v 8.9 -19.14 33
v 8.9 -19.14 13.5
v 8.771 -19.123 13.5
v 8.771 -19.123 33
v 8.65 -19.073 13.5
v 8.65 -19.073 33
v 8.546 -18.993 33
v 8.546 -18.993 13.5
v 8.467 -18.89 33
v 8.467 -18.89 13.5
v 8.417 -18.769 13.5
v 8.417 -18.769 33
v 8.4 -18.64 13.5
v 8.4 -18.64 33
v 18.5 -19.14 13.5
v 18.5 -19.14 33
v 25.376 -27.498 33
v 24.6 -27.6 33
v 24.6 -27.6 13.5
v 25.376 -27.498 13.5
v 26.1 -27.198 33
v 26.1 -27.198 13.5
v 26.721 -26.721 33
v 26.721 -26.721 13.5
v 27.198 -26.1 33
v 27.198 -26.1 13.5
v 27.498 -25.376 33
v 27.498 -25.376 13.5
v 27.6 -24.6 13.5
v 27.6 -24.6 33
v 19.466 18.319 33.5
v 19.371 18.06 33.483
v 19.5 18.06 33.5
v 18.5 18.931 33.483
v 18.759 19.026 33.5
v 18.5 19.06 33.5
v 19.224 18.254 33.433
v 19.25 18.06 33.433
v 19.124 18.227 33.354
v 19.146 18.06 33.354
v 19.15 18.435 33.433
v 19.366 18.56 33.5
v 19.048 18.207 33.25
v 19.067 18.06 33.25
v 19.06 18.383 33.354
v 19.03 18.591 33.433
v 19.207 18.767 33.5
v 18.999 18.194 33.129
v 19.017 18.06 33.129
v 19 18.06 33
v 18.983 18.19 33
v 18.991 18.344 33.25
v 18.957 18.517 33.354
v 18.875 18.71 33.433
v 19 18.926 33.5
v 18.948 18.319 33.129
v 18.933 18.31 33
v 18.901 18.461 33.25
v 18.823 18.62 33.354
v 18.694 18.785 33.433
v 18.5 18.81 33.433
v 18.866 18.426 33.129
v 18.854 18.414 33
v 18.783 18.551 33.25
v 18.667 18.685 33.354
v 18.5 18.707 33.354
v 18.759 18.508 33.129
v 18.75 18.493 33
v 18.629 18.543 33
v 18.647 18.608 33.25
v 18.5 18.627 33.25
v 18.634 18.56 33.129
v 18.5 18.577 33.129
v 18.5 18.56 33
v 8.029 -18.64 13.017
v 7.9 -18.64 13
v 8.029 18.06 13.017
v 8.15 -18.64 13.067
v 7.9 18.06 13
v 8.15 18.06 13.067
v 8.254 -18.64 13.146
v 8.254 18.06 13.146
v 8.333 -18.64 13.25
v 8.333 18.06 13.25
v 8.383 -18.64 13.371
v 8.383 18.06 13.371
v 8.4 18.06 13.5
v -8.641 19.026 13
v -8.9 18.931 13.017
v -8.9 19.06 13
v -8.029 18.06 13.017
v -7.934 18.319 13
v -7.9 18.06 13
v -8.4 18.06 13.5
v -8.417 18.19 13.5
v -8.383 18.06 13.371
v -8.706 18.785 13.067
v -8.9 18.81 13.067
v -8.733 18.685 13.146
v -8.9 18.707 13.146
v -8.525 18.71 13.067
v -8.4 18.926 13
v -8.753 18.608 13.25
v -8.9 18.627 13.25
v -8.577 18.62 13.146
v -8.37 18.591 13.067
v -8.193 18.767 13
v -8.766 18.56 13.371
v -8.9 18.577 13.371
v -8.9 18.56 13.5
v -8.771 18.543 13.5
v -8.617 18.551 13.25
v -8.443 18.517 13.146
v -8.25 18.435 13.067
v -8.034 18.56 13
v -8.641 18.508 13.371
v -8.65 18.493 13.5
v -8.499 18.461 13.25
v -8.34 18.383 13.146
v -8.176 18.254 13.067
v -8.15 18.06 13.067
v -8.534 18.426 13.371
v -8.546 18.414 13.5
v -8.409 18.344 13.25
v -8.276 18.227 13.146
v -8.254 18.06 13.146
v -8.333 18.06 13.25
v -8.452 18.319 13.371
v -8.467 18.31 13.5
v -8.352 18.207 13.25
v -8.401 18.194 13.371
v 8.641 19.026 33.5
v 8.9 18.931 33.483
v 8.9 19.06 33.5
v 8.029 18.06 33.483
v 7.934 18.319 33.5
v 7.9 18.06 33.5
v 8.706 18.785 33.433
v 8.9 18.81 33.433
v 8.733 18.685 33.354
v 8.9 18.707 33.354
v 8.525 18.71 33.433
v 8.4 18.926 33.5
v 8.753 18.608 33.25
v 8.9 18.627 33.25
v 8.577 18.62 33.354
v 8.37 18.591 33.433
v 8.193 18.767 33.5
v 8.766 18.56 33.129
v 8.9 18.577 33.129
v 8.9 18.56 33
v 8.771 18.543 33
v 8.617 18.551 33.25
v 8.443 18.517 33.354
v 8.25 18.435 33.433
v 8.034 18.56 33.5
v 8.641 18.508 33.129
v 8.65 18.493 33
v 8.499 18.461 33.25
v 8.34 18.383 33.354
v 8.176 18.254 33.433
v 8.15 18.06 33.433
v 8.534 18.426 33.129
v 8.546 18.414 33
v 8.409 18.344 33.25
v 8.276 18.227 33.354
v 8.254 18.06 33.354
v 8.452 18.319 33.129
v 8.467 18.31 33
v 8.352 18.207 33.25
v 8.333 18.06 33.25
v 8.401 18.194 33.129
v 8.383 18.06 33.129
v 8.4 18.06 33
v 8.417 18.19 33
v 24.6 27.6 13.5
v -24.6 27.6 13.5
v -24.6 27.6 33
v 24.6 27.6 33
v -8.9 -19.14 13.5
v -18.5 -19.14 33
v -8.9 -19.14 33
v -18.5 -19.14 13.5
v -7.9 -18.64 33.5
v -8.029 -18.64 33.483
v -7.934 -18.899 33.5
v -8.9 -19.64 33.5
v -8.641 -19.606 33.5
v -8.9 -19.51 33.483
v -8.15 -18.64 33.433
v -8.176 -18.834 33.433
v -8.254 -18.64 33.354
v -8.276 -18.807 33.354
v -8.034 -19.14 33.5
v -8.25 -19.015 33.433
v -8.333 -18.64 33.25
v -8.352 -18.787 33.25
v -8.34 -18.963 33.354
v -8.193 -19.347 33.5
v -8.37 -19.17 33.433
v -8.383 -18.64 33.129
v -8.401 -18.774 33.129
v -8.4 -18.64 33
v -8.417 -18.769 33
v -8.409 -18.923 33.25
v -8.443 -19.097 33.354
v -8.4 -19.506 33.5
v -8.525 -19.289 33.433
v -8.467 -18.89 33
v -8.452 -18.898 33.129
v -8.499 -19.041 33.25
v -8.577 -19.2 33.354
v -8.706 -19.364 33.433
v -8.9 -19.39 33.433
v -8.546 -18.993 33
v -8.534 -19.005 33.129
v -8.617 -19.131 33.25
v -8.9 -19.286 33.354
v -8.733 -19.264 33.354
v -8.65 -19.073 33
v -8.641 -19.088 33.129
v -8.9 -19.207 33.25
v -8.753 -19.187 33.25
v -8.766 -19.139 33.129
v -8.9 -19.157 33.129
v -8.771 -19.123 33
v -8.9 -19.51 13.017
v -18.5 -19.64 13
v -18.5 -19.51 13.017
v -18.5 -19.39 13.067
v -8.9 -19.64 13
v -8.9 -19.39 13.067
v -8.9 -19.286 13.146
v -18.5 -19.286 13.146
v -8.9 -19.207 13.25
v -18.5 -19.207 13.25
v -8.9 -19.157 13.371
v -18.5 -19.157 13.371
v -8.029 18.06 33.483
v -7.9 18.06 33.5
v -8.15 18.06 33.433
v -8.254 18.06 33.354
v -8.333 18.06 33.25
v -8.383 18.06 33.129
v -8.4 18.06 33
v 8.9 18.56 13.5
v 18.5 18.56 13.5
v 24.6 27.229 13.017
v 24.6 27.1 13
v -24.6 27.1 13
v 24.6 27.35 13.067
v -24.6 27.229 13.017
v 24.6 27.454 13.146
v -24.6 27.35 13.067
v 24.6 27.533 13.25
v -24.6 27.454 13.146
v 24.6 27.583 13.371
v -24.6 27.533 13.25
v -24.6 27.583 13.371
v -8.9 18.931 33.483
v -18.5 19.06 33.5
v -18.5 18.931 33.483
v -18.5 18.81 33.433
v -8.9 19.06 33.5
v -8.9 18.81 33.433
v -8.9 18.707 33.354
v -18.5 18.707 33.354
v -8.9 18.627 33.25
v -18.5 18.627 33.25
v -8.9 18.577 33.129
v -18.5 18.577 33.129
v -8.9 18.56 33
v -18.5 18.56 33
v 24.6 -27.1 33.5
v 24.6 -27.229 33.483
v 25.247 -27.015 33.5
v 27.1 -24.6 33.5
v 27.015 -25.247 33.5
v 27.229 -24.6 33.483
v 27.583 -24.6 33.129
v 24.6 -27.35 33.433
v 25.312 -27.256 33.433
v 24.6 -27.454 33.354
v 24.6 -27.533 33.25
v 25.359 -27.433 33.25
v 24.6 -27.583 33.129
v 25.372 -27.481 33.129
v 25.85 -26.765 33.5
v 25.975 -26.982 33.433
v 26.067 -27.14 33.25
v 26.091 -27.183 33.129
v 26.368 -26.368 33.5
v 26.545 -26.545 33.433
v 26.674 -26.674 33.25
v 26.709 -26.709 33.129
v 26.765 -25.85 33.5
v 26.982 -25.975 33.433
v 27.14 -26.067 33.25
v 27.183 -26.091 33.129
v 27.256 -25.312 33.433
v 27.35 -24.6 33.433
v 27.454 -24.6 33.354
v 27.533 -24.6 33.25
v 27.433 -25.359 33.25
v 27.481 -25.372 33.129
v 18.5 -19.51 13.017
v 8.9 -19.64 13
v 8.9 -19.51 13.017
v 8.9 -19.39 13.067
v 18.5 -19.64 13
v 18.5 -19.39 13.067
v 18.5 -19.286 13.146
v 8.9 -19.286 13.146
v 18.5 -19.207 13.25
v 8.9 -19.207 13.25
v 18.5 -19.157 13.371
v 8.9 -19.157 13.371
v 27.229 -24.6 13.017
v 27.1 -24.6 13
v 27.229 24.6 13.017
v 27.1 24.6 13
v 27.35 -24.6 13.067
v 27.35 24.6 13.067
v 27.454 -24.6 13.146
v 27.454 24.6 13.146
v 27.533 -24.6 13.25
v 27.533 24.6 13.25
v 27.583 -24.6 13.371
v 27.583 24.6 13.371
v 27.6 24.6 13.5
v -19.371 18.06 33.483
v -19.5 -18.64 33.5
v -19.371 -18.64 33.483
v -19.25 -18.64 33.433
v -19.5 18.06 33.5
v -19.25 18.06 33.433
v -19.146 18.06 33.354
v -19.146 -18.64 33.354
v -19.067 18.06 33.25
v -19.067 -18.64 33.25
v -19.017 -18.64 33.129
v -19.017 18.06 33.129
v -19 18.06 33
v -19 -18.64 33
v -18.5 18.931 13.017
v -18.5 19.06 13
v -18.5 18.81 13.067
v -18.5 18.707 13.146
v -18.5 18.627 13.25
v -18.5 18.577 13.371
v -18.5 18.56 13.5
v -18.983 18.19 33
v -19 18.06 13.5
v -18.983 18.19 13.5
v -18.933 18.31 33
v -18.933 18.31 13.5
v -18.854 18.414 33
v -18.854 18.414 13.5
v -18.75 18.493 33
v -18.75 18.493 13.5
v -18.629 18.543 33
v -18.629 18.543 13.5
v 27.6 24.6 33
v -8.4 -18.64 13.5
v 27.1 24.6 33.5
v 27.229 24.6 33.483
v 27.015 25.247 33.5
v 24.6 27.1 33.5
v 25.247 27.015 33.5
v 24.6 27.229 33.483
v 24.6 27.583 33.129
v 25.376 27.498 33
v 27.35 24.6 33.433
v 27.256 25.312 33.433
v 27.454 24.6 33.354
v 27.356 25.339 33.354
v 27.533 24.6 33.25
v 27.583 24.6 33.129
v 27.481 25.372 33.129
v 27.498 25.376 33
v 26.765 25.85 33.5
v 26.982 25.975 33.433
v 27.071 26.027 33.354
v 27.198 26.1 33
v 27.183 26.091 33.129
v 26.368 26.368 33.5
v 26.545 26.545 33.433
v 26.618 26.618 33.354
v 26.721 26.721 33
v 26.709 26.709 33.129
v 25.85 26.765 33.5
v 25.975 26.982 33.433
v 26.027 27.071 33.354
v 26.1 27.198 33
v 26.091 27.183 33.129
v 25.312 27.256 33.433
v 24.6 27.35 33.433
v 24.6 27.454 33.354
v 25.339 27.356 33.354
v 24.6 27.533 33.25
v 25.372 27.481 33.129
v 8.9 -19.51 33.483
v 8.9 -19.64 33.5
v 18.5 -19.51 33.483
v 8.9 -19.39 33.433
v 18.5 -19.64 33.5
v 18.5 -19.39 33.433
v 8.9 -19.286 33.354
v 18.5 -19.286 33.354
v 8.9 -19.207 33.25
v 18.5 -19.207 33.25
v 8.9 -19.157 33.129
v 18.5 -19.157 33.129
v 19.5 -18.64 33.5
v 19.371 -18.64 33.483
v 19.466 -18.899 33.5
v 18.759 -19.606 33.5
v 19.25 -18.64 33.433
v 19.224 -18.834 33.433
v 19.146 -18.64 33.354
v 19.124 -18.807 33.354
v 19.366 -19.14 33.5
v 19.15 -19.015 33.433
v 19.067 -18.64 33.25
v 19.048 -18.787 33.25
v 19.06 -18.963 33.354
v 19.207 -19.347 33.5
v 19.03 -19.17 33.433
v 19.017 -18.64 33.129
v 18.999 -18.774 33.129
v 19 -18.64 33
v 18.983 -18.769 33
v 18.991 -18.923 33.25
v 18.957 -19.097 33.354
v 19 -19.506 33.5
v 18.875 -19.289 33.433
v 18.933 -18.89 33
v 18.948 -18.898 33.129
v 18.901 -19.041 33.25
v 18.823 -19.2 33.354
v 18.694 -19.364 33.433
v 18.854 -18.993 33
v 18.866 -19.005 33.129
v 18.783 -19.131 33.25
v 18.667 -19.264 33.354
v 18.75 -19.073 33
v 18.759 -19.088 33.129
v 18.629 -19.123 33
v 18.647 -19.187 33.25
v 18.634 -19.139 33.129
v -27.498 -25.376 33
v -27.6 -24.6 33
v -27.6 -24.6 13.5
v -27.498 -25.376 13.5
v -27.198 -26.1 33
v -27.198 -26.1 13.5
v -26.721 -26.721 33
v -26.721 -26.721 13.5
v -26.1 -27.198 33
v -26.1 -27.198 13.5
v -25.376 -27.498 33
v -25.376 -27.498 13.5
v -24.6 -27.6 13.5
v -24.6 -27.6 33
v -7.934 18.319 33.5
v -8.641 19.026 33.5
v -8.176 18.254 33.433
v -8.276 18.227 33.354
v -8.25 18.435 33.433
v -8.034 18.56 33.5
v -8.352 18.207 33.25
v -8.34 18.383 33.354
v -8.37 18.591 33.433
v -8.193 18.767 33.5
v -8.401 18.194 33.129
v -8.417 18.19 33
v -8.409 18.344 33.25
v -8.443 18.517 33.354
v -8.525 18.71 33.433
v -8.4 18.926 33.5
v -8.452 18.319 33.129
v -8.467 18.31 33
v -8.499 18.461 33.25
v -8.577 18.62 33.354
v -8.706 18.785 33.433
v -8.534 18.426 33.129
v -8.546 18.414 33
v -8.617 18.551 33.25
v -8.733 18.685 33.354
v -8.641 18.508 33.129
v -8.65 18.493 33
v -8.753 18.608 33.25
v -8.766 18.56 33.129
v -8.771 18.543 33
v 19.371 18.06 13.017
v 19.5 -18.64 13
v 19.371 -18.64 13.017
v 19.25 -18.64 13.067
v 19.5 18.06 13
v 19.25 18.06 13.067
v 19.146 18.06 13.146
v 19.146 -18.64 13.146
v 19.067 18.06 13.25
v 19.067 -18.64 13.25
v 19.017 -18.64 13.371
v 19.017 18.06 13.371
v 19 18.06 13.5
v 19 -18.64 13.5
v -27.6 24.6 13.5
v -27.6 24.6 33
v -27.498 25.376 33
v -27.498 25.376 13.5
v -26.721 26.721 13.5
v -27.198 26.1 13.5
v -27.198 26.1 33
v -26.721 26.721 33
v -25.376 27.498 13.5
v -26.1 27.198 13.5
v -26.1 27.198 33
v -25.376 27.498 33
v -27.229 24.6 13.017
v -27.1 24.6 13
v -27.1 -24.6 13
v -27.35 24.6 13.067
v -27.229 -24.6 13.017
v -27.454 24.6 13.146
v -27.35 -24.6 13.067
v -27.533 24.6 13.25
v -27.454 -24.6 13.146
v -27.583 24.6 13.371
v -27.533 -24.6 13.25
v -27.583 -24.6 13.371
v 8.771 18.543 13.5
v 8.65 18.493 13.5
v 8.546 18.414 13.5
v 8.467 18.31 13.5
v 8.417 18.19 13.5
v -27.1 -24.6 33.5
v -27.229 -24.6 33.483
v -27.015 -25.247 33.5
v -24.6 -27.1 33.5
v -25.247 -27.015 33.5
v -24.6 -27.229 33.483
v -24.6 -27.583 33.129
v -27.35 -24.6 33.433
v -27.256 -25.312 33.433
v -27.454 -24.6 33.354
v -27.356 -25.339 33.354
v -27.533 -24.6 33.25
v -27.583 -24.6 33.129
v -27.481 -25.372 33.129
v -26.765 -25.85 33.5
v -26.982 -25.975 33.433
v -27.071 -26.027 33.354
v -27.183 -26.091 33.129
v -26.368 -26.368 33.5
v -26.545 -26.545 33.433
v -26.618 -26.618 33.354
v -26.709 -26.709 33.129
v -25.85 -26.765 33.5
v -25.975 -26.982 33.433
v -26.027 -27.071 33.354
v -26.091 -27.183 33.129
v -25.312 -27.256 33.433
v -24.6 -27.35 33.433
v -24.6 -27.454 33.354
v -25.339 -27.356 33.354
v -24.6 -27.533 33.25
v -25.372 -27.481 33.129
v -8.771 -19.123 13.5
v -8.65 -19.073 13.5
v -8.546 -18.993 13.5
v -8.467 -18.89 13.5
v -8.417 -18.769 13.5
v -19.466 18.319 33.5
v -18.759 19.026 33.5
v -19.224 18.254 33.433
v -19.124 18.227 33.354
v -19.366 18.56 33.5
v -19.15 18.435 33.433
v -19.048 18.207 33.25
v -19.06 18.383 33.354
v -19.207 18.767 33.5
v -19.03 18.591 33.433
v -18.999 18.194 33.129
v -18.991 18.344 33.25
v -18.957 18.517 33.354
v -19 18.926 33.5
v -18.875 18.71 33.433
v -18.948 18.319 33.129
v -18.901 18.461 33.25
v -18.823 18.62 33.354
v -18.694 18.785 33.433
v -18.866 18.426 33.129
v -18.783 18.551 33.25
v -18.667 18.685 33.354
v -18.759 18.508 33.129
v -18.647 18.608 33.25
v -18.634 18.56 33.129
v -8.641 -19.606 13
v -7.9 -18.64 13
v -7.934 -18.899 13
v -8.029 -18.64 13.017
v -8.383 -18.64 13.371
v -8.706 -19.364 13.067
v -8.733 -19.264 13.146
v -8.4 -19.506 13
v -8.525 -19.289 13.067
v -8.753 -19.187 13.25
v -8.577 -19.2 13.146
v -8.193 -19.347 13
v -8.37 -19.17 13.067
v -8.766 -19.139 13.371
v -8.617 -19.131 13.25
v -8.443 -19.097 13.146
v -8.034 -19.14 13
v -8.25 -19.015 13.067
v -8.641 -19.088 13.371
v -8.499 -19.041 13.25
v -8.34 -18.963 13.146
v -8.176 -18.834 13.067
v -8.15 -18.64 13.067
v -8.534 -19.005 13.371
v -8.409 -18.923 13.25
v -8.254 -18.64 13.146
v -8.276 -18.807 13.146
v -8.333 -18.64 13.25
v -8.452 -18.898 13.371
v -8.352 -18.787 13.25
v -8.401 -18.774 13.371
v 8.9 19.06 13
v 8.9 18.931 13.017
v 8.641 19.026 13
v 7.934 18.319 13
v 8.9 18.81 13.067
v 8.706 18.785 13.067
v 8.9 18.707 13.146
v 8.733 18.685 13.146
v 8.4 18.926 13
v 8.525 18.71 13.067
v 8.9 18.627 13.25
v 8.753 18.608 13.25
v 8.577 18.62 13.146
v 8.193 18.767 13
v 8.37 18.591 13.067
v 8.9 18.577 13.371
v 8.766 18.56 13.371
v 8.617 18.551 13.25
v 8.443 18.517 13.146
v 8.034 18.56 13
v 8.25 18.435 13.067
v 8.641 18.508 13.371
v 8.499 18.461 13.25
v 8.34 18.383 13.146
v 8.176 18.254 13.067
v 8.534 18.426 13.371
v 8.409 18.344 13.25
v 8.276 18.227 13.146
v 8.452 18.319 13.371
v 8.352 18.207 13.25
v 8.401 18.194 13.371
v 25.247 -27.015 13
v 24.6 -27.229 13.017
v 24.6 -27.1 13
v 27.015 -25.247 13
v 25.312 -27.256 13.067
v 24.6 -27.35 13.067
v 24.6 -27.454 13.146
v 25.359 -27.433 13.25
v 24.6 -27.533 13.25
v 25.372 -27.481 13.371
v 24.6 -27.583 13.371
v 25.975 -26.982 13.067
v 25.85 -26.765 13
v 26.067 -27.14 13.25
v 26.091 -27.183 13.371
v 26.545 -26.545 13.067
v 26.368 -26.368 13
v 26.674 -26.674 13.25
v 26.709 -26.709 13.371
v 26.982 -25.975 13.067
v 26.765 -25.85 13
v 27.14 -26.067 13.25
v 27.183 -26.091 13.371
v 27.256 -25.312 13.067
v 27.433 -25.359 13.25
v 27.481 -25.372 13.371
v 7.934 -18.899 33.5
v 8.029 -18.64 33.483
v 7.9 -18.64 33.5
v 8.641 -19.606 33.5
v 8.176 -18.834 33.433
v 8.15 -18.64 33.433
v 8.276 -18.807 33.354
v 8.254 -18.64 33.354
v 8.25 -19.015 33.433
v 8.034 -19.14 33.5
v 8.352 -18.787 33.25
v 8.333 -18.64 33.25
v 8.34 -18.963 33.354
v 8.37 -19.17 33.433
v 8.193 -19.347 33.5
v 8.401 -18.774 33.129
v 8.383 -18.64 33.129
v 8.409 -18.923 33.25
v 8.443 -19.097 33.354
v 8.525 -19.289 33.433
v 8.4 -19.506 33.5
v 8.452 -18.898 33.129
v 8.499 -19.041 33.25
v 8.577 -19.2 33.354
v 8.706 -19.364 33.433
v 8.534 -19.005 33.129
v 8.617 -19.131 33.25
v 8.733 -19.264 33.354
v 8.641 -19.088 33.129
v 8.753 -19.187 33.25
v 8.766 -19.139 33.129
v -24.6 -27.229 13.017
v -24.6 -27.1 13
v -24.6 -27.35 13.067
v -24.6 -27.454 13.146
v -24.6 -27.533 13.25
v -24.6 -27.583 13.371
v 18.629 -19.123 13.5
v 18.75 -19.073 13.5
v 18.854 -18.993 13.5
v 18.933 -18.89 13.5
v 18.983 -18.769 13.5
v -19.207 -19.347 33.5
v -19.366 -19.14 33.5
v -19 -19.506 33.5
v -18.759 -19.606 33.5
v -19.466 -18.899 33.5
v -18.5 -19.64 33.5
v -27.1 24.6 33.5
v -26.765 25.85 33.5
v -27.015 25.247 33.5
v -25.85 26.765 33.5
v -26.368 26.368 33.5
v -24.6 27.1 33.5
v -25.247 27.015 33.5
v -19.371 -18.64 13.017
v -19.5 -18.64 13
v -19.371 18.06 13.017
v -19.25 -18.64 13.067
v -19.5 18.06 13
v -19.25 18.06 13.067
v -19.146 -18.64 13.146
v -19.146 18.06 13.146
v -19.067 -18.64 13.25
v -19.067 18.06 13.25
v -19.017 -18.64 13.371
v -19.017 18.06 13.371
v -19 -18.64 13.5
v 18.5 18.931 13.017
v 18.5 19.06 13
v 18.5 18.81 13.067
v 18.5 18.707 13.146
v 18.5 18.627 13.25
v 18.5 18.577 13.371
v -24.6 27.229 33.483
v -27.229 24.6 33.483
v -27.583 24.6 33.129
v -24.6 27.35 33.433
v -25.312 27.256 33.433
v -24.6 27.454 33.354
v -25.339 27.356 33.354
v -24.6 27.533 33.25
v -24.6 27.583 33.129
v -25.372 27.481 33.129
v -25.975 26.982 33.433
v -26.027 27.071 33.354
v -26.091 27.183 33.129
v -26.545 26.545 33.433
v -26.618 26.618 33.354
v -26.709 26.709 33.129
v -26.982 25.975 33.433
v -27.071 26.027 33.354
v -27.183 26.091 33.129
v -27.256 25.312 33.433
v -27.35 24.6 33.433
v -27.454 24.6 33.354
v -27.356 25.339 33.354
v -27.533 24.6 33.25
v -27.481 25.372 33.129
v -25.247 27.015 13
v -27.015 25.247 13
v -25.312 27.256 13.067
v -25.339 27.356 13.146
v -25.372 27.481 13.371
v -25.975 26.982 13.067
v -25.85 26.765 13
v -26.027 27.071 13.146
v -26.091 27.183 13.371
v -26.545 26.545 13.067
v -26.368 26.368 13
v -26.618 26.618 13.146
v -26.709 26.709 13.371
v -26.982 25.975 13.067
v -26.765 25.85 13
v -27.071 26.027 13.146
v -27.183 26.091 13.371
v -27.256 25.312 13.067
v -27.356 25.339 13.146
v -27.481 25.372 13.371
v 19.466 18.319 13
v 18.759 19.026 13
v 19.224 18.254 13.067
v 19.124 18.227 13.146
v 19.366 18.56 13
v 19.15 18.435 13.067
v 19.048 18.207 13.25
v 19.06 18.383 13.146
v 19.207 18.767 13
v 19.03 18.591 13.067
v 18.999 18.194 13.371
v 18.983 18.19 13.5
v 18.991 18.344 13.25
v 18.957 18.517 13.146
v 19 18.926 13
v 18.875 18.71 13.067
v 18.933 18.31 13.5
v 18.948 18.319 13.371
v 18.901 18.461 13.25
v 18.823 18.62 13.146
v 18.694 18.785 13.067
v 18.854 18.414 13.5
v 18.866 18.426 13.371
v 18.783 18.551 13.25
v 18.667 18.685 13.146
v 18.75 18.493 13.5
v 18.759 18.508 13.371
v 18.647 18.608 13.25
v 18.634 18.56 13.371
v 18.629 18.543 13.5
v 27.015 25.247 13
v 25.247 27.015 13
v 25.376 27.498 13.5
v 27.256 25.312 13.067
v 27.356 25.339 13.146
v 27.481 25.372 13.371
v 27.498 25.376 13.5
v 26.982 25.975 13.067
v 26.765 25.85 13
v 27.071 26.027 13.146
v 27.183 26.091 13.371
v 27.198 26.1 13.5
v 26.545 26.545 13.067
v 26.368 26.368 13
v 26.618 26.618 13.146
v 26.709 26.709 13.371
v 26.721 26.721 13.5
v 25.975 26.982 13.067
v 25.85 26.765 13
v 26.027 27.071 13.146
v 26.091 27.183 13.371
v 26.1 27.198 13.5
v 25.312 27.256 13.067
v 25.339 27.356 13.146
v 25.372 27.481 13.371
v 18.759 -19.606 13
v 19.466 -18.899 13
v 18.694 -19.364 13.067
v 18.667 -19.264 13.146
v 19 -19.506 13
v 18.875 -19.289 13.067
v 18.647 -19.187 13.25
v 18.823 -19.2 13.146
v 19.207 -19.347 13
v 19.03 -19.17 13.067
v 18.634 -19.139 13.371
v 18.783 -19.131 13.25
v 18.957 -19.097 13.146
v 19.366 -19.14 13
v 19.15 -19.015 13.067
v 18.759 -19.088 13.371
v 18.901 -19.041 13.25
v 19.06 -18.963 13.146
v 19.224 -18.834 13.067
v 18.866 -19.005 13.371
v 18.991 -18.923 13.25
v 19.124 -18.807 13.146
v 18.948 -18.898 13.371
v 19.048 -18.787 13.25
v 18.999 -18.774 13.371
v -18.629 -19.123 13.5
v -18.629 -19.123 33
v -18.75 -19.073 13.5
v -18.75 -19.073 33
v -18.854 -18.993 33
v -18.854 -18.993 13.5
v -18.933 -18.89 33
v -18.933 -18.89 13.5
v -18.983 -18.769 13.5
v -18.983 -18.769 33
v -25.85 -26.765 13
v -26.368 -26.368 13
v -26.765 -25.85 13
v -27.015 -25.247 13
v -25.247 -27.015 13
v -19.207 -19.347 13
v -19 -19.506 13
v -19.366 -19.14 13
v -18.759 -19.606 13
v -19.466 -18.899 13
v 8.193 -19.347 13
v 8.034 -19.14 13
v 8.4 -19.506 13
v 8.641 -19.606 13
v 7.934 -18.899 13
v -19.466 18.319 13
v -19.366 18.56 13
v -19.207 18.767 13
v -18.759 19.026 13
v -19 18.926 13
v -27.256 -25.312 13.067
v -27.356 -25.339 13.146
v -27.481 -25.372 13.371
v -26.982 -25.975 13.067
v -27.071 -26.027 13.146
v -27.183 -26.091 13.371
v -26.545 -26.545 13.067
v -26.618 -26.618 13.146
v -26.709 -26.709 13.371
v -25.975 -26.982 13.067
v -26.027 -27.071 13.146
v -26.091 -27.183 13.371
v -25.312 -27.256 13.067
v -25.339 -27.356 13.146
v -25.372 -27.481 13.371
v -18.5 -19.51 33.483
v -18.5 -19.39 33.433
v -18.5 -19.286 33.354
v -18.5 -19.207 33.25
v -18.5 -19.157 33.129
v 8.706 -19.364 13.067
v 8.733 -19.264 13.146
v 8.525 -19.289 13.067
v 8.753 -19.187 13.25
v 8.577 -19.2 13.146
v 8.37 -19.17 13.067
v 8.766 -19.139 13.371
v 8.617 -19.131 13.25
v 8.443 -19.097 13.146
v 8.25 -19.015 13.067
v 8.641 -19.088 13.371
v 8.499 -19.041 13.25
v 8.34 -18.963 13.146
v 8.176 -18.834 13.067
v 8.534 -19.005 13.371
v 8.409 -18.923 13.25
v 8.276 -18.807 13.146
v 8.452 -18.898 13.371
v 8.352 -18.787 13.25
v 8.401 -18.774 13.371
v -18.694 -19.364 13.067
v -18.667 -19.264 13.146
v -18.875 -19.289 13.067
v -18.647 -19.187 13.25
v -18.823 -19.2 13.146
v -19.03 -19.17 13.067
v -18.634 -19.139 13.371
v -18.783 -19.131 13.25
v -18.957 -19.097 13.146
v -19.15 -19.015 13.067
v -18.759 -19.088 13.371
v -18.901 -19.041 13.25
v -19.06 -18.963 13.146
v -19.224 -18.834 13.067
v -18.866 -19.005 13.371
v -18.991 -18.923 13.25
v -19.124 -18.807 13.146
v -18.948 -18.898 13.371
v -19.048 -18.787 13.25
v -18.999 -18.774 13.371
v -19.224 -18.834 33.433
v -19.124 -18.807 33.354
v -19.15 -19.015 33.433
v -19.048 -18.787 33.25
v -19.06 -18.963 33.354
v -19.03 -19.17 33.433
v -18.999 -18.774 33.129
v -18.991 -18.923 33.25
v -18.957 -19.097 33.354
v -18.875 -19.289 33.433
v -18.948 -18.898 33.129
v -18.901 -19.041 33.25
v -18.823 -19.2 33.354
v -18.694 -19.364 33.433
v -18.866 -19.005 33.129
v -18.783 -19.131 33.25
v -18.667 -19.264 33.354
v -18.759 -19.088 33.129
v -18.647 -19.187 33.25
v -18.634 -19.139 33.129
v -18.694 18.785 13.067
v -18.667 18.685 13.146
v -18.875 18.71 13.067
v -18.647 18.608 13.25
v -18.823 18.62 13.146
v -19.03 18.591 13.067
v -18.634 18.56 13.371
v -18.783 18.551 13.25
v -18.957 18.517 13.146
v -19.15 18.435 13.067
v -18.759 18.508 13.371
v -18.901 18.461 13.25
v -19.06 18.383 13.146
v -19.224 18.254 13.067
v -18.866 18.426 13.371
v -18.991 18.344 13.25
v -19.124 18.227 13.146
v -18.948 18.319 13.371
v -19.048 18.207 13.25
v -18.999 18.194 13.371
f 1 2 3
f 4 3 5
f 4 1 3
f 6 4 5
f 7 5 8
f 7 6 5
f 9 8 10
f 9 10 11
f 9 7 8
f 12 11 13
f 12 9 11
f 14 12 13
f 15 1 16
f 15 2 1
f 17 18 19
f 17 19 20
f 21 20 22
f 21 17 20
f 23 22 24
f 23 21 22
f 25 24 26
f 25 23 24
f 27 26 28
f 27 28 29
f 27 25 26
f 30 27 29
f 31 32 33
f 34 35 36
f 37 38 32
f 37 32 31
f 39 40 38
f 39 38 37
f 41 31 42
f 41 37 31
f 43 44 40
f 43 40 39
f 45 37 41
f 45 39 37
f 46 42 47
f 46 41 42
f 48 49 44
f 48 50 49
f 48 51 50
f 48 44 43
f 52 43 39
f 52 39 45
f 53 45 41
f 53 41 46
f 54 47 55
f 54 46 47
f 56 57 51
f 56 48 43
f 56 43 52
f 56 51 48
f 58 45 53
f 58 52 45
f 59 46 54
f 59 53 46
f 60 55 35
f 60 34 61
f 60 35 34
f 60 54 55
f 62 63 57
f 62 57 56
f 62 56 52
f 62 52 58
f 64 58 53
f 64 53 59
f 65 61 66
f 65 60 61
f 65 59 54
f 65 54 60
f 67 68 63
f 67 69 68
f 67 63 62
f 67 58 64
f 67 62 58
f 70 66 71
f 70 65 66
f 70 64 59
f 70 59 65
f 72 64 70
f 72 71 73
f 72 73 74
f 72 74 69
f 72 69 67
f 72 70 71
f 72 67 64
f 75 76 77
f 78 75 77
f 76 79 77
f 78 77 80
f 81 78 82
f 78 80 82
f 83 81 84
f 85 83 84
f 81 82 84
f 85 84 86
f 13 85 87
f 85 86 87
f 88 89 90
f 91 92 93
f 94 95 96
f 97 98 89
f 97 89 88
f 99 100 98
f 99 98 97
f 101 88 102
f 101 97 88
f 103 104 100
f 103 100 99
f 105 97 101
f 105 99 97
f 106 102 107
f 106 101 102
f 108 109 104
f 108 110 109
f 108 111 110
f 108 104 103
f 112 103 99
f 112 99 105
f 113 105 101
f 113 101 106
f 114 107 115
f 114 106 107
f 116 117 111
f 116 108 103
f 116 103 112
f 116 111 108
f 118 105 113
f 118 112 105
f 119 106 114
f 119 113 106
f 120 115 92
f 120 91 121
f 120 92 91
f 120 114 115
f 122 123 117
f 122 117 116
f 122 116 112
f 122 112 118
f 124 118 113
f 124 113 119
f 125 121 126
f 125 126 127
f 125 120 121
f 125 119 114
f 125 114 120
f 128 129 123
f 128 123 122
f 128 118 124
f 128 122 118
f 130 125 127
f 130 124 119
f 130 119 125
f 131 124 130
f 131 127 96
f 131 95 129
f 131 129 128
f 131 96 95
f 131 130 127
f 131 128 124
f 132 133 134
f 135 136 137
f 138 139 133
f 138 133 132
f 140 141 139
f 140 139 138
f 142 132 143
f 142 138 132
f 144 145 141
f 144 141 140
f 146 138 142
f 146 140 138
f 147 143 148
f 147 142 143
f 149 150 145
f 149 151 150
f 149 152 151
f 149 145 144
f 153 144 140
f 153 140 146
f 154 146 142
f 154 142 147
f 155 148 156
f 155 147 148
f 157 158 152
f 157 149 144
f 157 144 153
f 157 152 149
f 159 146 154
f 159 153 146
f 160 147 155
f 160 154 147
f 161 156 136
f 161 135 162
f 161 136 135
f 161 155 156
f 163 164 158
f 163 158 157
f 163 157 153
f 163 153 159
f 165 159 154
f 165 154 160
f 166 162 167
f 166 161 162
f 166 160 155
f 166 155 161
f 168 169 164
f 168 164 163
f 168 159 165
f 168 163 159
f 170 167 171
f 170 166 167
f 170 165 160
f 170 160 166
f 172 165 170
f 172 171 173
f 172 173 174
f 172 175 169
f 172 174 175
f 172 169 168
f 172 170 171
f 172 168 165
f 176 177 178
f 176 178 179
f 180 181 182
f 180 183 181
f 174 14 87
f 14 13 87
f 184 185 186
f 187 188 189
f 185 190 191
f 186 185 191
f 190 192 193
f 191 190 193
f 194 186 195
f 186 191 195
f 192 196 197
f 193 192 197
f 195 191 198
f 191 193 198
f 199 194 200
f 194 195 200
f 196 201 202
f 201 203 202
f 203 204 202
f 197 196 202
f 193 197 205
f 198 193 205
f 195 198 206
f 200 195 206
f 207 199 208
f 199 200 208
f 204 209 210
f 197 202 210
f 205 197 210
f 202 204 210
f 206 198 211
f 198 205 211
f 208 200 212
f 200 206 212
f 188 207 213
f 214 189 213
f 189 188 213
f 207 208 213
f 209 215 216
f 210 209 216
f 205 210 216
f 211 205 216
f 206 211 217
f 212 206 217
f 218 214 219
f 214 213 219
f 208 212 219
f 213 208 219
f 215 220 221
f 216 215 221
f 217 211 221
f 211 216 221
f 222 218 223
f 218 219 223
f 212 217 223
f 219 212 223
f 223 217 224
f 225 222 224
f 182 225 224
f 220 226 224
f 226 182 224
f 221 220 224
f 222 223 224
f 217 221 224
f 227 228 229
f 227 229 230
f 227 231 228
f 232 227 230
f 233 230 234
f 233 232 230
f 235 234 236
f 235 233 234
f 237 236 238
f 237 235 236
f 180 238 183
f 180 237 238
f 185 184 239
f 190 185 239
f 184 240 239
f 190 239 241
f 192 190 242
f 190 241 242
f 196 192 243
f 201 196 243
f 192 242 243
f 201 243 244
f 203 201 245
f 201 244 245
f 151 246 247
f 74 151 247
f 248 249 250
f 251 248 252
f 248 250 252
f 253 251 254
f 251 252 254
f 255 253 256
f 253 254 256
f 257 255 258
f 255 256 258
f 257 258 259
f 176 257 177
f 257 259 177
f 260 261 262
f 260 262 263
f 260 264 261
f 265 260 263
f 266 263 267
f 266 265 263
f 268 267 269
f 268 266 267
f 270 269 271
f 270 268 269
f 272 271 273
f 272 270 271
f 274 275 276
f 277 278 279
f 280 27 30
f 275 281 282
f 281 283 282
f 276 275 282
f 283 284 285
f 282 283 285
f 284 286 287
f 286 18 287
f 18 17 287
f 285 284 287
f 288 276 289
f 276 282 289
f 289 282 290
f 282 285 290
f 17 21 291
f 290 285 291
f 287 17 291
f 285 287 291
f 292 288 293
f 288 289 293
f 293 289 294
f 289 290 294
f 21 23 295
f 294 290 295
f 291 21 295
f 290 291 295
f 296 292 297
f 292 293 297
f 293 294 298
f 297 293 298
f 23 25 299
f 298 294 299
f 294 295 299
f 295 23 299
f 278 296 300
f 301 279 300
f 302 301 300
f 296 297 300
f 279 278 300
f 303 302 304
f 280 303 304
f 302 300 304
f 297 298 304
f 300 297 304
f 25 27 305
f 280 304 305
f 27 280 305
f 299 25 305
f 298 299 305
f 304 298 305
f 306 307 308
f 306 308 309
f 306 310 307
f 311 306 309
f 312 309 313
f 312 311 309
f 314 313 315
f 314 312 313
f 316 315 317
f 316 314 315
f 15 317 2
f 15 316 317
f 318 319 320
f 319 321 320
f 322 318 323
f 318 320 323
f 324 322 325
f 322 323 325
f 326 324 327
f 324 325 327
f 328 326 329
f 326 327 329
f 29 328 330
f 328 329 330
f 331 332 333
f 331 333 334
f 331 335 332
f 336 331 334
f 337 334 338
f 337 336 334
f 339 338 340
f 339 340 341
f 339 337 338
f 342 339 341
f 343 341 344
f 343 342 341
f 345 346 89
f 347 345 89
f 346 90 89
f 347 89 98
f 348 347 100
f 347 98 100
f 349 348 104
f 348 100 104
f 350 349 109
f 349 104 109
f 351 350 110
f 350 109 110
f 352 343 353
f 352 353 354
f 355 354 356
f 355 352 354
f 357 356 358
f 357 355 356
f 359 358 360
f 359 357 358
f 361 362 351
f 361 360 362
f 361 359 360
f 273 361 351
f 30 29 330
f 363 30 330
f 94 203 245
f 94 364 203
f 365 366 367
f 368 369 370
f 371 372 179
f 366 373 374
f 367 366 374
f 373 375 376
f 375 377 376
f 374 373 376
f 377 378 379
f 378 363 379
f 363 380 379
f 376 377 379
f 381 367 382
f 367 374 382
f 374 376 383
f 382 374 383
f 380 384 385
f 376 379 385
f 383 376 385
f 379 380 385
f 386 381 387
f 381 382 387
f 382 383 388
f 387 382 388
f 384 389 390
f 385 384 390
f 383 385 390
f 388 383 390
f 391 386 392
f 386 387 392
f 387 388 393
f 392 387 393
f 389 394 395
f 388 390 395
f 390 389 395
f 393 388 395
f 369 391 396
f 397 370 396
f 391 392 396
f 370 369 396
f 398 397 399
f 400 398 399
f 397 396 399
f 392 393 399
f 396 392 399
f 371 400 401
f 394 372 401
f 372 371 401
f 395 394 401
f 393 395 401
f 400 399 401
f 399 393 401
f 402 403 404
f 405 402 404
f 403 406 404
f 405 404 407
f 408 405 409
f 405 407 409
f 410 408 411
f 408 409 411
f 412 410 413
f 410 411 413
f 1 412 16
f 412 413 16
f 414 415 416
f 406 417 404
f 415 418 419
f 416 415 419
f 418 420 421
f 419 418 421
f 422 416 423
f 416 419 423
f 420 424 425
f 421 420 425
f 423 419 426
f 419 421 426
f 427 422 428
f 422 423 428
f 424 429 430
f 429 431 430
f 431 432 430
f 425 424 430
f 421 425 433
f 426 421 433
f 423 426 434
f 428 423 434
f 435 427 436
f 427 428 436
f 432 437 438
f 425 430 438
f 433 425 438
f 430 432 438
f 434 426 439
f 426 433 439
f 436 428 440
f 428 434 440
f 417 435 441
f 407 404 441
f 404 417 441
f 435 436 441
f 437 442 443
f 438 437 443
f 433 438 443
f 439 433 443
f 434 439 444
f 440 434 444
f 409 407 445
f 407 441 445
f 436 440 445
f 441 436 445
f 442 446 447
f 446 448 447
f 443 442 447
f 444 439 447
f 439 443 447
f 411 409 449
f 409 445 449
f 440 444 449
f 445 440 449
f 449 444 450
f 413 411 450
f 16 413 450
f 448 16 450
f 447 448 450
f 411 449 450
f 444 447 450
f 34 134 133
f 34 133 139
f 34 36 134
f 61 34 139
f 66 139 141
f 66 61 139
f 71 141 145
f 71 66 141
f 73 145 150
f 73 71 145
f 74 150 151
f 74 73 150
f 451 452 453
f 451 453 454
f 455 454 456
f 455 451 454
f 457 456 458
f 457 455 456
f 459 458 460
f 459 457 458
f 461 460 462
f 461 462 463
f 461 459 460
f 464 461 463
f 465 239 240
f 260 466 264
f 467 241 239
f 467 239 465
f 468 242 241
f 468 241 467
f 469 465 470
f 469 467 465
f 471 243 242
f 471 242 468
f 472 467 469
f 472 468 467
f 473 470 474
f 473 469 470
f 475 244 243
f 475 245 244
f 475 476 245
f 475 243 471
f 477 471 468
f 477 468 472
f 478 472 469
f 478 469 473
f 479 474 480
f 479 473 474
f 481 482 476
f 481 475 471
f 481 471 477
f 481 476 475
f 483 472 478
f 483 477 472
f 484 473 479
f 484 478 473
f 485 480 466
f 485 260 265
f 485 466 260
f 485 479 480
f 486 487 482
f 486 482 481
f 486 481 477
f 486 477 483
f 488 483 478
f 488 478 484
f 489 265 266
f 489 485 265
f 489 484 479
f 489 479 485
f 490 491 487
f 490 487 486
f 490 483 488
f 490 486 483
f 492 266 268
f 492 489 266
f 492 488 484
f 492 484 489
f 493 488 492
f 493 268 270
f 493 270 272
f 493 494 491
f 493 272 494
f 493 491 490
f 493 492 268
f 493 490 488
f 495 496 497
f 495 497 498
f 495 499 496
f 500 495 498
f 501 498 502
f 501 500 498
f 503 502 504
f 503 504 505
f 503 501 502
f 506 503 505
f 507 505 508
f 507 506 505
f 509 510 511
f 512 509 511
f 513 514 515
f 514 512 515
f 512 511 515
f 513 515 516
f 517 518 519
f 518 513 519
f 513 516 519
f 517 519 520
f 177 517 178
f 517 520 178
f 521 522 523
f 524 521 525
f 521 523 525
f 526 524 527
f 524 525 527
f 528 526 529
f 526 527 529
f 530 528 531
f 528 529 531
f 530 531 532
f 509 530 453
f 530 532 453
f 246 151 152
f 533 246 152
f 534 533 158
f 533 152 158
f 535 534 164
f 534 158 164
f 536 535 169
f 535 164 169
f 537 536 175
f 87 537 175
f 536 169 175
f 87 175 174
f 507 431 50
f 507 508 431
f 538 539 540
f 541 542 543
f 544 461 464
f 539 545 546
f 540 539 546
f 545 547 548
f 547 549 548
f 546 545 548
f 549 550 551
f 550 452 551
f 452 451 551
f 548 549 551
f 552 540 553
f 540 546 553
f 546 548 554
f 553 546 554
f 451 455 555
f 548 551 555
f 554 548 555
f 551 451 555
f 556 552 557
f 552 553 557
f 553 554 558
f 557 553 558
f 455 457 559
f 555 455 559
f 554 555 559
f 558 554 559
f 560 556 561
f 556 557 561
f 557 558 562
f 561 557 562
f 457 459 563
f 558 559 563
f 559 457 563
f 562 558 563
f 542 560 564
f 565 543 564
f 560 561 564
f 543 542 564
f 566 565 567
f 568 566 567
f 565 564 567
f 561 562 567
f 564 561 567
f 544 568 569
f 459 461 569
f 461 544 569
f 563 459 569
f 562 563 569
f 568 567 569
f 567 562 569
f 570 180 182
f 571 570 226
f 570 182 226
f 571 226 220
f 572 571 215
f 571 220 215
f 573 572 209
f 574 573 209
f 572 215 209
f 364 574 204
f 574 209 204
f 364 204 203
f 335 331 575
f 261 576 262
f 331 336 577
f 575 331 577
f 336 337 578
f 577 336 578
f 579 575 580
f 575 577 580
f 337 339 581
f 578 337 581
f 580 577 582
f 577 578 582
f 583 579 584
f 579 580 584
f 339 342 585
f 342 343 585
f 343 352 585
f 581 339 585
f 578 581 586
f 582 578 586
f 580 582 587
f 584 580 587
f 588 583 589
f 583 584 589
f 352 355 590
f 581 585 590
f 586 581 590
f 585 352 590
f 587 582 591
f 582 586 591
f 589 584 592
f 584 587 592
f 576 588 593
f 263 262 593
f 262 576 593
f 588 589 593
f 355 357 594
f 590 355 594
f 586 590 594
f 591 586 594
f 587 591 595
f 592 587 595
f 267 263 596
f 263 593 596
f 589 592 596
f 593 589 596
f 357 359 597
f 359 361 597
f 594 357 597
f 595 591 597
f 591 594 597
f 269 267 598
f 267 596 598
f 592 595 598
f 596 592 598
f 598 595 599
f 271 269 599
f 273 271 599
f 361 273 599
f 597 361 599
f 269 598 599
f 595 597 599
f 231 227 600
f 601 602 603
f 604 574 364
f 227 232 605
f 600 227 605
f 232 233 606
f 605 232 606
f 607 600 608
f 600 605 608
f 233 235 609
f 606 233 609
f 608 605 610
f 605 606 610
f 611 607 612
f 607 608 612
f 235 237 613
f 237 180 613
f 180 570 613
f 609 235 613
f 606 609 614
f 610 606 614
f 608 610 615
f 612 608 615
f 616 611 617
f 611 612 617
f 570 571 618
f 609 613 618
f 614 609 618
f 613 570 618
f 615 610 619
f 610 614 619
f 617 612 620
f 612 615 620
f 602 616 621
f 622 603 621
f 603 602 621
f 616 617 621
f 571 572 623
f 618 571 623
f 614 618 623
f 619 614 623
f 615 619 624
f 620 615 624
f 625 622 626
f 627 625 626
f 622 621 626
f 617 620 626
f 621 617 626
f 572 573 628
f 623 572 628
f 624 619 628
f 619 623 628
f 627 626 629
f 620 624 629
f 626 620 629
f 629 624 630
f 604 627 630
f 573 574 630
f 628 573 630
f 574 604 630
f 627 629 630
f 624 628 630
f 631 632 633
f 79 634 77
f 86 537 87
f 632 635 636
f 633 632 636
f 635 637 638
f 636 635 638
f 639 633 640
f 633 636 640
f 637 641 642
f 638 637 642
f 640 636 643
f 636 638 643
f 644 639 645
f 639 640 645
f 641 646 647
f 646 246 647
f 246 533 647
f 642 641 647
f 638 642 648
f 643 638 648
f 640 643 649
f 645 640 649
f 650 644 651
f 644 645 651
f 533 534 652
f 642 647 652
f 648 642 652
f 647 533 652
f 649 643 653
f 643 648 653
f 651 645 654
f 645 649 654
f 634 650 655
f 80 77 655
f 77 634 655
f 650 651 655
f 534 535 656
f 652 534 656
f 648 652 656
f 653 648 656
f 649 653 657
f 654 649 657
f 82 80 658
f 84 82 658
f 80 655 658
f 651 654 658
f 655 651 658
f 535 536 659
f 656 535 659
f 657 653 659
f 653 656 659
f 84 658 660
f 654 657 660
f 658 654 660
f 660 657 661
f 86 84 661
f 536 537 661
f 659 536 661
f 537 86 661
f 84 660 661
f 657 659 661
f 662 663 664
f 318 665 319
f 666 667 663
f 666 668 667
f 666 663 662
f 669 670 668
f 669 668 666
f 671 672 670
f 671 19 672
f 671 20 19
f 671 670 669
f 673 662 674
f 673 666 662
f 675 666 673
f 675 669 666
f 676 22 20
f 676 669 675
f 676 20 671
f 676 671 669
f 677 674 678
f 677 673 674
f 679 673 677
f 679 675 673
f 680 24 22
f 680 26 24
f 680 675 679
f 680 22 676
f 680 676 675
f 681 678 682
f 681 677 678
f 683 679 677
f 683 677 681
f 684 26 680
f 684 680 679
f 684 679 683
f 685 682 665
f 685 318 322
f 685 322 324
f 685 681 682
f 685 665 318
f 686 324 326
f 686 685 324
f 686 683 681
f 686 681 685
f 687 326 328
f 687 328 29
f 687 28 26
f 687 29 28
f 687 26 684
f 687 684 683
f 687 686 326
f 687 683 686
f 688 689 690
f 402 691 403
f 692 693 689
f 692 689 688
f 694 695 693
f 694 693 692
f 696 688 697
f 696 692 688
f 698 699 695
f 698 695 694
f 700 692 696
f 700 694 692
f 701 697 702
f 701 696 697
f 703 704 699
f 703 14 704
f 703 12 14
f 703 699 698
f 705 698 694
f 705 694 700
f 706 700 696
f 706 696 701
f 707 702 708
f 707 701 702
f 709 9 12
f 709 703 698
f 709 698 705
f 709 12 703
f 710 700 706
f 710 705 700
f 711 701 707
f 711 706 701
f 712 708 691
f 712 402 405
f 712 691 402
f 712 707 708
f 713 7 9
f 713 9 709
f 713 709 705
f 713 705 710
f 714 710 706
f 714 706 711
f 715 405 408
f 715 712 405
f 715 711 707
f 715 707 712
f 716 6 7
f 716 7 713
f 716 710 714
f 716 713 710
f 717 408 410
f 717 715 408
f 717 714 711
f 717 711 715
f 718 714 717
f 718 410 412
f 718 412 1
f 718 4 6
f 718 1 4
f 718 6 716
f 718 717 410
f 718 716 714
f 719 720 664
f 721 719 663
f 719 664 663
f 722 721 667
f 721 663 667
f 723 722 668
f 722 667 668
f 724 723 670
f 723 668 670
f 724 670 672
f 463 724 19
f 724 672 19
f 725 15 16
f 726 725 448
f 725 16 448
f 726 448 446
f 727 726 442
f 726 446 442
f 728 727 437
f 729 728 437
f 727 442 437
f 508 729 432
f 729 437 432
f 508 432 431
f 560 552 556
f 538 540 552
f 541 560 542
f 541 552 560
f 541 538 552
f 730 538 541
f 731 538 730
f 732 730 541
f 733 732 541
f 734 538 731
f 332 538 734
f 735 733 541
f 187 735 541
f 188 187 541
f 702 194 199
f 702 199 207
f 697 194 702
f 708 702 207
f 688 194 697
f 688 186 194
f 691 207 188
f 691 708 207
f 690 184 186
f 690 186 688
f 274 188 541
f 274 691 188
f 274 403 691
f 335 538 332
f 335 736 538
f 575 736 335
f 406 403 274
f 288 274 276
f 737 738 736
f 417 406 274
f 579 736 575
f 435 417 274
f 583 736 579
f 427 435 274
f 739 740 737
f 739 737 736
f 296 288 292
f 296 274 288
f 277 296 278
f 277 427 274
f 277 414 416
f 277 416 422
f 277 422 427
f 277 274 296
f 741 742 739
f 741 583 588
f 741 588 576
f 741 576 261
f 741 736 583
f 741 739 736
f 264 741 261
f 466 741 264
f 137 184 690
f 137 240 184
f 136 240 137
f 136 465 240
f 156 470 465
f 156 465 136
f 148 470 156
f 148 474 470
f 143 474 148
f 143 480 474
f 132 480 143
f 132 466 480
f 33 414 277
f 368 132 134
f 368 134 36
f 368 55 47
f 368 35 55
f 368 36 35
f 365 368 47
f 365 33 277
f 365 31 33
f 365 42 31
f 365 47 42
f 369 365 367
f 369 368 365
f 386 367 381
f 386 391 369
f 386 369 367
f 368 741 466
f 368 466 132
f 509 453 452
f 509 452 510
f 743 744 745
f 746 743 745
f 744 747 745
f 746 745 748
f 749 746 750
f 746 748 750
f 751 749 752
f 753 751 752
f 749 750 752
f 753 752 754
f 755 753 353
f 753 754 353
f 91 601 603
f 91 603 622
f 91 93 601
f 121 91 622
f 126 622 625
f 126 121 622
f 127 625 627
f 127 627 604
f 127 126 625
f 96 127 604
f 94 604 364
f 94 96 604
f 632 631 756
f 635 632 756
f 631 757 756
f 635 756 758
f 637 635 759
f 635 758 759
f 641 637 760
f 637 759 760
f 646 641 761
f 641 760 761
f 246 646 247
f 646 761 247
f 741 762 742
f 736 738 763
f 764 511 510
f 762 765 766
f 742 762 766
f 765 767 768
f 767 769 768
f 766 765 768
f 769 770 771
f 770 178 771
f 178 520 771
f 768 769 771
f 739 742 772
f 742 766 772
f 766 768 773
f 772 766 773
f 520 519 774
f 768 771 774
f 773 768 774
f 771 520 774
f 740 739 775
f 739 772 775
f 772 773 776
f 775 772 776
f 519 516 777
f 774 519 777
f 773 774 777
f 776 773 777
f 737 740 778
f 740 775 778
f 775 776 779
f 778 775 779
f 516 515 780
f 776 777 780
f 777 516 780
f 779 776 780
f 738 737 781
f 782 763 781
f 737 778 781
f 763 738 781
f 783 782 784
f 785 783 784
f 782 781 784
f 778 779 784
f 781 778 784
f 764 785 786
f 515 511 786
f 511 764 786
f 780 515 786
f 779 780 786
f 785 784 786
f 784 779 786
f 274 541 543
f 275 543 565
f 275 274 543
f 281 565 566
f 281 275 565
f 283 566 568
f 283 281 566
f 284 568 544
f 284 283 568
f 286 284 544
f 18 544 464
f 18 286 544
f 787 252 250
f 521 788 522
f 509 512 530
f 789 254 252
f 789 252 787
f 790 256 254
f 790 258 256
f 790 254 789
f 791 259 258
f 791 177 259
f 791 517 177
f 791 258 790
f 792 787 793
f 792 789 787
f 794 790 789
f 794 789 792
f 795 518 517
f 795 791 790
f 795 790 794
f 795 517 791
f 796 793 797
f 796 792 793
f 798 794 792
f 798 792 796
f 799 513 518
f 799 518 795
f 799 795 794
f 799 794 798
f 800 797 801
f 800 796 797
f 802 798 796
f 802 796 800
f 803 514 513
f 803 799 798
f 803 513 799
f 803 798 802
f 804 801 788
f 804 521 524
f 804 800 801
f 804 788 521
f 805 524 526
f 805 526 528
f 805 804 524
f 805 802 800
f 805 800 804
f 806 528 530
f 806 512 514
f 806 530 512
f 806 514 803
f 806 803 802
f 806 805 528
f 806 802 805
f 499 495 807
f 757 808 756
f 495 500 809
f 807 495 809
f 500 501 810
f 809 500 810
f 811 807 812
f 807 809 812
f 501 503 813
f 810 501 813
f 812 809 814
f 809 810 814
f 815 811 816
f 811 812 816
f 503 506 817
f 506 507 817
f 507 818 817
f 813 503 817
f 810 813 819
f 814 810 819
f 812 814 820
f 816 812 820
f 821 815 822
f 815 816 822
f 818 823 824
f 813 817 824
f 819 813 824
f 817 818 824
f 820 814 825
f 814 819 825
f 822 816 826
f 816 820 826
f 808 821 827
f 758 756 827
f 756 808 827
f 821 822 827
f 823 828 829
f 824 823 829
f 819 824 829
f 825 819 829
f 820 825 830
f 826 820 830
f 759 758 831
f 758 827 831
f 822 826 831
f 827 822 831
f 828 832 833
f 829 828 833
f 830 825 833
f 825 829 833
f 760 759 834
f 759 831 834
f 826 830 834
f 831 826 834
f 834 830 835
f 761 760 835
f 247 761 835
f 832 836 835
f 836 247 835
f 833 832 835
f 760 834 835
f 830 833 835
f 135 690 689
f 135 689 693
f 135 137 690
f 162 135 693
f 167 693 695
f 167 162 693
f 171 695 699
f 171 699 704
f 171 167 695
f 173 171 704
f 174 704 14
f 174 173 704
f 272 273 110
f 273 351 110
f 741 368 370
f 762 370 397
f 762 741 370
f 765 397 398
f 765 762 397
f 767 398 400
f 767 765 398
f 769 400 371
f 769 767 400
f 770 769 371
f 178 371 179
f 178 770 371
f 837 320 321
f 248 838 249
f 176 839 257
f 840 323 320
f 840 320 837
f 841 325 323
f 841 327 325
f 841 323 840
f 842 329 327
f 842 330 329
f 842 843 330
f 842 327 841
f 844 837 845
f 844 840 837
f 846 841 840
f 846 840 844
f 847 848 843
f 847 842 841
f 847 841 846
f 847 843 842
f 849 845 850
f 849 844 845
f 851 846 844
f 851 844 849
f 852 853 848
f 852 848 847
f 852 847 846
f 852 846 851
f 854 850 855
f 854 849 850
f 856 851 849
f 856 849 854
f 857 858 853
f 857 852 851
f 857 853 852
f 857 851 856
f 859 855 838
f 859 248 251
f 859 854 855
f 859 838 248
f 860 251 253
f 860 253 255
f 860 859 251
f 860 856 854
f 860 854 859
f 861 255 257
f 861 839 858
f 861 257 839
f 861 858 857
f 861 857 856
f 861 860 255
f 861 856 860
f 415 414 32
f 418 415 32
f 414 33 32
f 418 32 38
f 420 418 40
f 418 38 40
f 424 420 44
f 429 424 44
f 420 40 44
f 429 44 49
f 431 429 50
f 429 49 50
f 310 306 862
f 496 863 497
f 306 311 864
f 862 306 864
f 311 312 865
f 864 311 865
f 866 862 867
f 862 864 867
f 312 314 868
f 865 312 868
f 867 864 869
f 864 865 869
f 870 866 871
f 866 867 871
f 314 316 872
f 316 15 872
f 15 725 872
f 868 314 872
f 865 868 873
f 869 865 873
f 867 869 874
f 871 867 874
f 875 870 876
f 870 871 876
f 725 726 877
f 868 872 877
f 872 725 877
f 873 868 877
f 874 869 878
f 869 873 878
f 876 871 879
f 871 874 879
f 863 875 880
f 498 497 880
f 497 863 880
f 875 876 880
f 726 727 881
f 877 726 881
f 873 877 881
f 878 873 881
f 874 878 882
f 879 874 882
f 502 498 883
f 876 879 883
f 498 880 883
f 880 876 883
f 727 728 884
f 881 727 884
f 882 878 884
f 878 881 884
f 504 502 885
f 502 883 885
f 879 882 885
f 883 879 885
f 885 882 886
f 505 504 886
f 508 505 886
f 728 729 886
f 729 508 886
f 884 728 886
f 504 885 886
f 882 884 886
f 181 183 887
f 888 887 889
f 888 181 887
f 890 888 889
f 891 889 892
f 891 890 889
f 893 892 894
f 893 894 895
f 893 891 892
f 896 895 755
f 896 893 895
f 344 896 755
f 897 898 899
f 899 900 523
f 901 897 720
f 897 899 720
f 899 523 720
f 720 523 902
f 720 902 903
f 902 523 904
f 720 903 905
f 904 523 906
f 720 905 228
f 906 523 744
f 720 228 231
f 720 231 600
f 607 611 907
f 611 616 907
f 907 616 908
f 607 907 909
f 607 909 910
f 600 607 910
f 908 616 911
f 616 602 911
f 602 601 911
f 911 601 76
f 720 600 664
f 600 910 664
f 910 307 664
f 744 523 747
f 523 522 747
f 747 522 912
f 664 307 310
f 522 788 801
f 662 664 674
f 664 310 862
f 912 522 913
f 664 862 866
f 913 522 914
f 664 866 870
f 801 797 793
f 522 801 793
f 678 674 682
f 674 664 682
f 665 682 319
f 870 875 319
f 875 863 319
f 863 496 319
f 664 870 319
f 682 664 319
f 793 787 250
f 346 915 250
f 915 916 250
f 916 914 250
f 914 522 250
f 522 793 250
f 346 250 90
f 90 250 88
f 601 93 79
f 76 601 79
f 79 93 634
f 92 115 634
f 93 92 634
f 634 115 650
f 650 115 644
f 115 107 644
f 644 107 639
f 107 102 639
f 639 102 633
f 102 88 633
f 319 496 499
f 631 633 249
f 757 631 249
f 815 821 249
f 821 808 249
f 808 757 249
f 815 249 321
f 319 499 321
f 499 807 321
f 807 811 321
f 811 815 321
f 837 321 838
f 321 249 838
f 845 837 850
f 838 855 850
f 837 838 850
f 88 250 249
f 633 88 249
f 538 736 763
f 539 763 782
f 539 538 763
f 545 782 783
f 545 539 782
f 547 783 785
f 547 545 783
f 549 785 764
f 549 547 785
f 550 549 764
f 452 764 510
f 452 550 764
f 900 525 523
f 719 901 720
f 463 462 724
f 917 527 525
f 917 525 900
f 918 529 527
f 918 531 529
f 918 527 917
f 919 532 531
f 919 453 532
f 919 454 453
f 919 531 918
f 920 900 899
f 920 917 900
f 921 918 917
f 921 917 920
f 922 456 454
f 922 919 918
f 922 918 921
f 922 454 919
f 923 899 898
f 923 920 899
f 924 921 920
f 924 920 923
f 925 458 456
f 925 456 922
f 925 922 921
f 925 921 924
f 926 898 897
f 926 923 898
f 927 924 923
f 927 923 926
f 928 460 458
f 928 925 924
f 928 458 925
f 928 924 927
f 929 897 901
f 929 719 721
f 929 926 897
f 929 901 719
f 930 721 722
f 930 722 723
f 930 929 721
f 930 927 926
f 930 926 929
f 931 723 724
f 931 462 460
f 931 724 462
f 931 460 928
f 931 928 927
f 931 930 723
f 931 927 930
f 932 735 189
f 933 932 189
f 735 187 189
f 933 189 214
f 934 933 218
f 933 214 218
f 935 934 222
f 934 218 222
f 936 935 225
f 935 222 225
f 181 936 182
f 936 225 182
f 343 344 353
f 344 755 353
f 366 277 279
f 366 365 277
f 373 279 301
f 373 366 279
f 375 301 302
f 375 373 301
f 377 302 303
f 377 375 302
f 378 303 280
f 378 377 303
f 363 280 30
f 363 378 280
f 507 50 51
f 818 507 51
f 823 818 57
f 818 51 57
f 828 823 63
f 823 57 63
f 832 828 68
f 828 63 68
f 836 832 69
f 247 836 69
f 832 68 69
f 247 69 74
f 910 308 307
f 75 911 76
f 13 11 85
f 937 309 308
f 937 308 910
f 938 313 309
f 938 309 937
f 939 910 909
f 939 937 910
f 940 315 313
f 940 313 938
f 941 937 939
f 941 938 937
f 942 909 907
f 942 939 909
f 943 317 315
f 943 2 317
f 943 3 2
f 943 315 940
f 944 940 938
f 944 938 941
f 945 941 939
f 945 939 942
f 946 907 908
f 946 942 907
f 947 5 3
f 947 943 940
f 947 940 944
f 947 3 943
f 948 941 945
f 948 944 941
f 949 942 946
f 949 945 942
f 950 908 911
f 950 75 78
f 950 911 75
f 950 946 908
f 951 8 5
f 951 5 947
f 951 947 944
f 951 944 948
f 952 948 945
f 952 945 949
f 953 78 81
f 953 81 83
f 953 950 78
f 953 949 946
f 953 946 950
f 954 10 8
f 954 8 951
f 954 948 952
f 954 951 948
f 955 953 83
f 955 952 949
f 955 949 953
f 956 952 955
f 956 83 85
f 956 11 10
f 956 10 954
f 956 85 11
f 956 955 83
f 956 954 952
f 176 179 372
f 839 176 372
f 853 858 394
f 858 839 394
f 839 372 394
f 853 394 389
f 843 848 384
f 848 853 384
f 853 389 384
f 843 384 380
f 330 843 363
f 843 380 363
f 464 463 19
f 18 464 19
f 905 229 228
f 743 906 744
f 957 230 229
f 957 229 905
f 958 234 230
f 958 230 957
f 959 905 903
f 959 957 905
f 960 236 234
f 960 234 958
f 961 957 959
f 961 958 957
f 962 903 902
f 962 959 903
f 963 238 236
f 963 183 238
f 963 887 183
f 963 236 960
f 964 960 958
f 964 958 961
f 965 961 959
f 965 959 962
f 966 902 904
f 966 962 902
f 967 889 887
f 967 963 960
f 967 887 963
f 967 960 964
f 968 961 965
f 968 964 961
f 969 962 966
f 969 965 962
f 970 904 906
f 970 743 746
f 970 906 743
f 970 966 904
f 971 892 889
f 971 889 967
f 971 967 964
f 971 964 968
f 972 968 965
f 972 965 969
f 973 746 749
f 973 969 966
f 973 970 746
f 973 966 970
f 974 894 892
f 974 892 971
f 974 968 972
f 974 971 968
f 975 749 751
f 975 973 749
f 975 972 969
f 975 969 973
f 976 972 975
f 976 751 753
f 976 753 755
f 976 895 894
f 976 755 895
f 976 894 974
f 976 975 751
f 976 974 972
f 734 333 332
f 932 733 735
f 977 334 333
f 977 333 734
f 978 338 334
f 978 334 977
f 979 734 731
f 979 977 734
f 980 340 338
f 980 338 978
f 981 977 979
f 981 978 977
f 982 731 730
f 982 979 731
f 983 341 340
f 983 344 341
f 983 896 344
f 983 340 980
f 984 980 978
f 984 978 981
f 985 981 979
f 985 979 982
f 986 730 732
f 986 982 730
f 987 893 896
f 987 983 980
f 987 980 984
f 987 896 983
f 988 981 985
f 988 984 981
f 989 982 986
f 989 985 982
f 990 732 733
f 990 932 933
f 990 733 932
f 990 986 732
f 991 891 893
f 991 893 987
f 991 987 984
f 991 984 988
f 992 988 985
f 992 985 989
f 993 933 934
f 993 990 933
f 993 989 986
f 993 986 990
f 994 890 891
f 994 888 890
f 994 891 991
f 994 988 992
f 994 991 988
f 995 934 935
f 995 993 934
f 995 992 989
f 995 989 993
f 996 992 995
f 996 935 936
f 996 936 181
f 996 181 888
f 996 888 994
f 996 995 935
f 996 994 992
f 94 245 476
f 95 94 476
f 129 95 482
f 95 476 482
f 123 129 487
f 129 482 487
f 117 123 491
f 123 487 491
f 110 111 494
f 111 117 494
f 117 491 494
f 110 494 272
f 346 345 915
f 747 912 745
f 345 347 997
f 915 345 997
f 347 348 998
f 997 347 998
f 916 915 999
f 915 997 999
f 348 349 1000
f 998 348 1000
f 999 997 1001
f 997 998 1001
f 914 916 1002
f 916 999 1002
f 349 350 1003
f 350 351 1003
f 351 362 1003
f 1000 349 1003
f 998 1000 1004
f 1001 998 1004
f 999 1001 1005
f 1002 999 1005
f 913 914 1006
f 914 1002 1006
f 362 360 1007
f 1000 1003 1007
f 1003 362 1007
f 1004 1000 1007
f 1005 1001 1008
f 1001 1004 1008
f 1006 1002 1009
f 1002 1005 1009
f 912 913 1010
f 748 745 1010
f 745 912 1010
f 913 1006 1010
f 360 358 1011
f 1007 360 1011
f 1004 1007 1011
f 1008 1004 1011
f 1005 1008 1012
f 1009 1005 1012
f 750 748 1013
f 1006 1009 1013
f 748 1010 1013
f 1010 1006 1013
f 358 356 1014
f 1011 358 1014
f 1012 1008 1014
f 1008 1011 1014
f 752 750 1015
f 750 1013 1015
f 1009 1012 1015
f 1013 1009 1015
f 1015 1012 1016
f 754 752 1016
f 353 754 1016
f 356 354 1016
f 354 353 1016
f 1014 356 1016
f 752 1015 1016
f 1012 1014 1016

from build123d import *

# Parameters (mm, degrees)
F1_START = 13
F0_W     = 55.2
F0_H     = 55.2
F0_W_2   = 10.6
F0_H_2   = 37.7
F1_DEPTH = 20.5
F2_R     = 3
F3_R     = 0.5


with BuildPart() as f1:
    # F0 (on Top) → F1 (new body)
    with BuildSketch(Plane.XY.offset(F1_START)):
        Rectangle(F0_W, F0_H)
        with Locations((-13.7, -0.2898262978)):
            Rectangle(F0_W_2, F0_H_2, mode=Mode.SUBTRACT)
        with Locations((13.7, -0.2898262978)):
            Rectangle(F0_W_2, F0_H_2, mode=Mode.SUBTRACT)
    extrude(amount=F1_DEPTH)

    # F2
    f2_edges = [f1.edges().sort_by_distance(p)[0] for p in [
        (-27.6, -27.6, 23.25),
        (27.6, -27.6, 23.25),
        (27.6, 27.6, 23.25),
        (-27.6, 27.6, 23.25),
    ]]
    fillet(f2_edges, radius=F2_R)

    # F3
    f3_edges = [f1.edges().sort_by_distance(p)[0] for p in [
        (-8.4, -0.289826, 33.5),
        (-19, -0.289826, 33.5),
        (-13.7, 18.560174, 33.5),
        (8.4, -0.289826, 33.5),
        (-19, 18.560174, 23.25),
        (-13.7, -19.139826, 33.5),
        (8.4, 18.560174, 23.25),
        (19, -0.289826, 33.5),
        (13.7, -19.139826, 33.5),
        (27.6, 0, 13),
        (0, -27.6, 13),
        (27.6, 0, 33.5),
        (0, -27.6, 33.5),
        (0, 27.6, 33.5),
        (-13.7, 18.560174, 13),
        (13.7, 18.560174, 33.5),
        (-13.7, -19.139826, 13),
        (19, -0.289826, 13),
        (-24.6, -27.6, 23.25),
        (13.7, 18.560174, 13),
        (-26.72132, -26.72132, 33.5),
        (-27.6, -24.6, 23.25),
        (24.6, 27.6, 23.25),
        (26.72132, 26.72132, 13),
        (-8.4, -0.289826, 13),
        (26.72132, 26.72132, 33.5),
        (27.6, 24.6, 23.25),
        (-19, -0.289826, 13),
        (-19, -19.139826, 23.25),
        (-8.4, -19.139826, 23.25),
        (-8.4, 18.560174, 23.25),
        (8.4, -0.289826, 13),
        (19, 18.560174, 23.25),
        (8.4, -19.139826, 23.25),
        (19, -19.139826, 23.25),
        (26.72132, -26.72132, 13),
        (26.72132, -26.72132, 33.5),
        (24.6, -27.6, 23.25),
        (27.6, -24.6, 23.25),
        (-26.72132, -26.72132, 13),
        (-27.6, 0, 33.5),
        (-27.6, 0, 13),
        (0, 27.6, 13),
        (-27.6, 24.6, 23.25),
        (13.7, -19.139826, 13),
        (-24.6, 27.6, 23.25),
        (-26.72132, 26.72132, 13),
        (-26.72132, 26.72132, 33.5),
    ]]
    fillet(f3_edges, radius=F3_R)


solid = f1.part
